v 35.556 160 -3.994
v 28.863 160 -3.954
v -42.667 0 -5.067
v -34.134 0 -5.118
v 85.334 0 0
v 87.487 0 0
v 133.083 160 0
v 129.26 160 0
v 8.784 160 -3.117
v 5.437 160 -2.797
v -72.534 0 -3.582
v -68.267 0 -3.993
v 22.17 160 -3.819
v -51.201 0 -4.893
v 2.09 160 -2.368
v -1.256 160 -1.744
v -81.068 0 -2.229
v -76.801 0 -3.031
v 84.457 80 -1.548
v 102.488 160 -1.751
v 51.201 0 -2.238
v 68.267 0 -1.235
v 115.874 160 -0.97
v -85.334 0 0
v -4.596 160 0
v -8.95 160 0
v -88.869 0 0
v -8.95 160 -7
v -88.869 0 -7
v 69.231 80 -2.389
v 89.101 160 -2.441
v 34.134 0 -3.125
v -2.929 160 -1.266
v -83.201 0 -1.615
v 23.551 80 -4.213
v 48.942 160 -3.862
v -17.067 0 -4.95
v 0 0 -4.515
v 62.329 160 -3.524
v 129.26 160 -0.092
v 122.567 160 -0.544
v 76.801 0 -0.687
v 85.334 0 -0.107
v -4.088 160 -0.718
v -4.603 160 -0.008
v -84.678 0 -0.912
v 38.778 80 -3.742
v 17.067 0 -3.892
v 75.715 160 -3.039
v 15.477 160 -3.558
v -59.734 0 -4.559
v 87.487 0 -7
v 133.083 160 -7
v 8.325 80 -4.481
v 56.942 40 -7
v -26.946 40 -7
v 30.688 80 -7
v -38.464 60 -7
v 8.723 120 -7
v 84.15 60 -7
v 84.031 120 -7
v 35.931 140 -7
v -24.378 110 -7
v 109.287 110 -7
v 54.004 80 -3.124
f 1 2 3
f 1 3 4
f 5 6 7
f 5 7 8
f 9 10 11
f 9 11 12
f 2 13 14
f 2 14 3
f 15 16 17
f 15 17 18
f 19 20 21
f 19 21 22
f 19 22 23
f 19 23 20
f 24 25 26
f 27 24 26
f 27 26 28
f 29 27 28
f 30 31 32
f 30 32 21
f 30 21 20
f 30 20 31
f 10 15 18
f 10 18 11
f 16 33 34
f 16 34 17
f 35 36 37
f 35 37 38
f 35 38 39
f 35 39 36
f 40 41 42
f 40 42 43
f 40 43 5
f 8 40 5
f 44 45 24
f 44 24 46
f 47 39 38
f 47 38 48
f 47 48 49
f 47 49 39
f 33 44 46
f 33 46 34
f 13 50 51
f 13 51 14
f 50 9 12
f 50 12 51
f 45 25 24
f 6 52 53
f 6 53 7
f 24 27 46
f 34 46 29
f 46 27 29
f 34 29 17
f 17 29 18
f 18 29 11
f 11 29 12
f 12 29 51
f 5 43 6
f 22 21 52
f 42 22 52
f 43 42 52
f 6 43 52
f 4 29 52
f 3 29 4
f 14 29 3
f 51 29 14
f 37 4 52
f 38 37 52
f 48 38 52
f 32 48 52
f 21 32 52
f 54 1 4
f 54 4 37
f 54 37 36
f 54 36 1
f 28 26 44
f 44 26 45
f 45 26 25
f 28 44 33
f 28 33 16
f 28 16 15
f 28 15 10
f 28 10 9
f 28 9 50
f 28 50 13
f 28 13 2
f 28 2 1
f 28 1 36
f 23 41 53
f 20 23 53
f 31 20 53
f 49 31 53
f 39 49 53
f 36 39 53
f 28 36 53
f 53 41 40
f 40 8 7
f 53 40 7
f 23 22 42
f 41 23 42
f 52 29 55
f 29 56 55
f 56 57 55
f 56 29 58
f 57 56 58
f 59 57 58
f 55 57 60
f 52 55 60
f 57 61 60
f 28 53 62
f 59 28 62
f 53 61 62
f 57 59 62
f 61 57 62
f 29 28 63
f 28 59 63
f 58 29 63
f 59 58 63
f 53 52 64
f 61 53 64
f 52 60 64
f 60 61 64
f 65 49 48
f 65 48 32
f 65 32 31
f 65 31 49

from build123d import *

# Parameters (mm, degrees)
F7_W      = 124.4431979082
F7_H      = 7
F9_W      = 74.3127836547
F9_H      = 7
F14_W     = 276.002407074
F14_H     = 30.9464875609
F15_DEPTH = 200


with BuildPart() as f5:
    # F2 (on Front) → F5 section 0
    with BuildSketch(Plane.XZ):
        Polygon((85.33424, -0.107453), (85.33424, 0.107451), (76.800816, 0.687353), (68.267393, 1.234847), (51.200543, 2.237735), (34.133696, 3.124644), (17.066846, 3.892161), (2e-06, 4.514701), (-17.066845, 4.949631), (-34.133695, 5.118482), (-42.667119, 5.067315), (-51.200542, 4.893345), (-59.733967, 4.559047), (-68.267391, 3.99279), (-72.534103, 3.581742), (-76.800815, 3.030836), (-81.067527, 2.229209), (-83.200883, 1.615195), (-84.614532, 0.89556), (-85.334239, -2e-06), (-84.677983, -0.911667), (-83.200883, -1.615199), (-81.067527, -2.22921), (-76.800815, -3.03084), (-72.534103, -3.581744), (-68.267391, -3.992792), (-59.733967, -4.559048), (-51.200542, -4.893346), (-42.667119, -5.067316), (-34.133695, -5.118483), (-17.066845, -4.949632), (2e-06, -4.514702), (17.066846, -3.892165), (34.133696, -3.124645), (51.200543, -2.237736), (68.267393, -1.234851), (76.800816, -0.687357), align=None)
    # F3 (on offset) → F5 section 1
    with BuildSketch(Plane.XZ.offset(-242)):
        Polygon((151.7721883423, -0.0841142291), (151.7721883423, 0.0588466904), (146.022191309, 0.4446183214), (140.27219327, 0.8088308689), (128.7721891468, 1.4759898717), (117.2721910575, 2.0659895201), (105.7721869344, 2.5765721341), (94.2721918621, 2.9907080691), (82.7721907559, 3.2800390551), (71.2721896496, 3.3923649172), (65.5221916107, 3.3583267467), (59.7721895491, 3.2425957602), (54.0221894988, 3.0202077499), (48.2721884429, 2.6435161153), (45.3971894234, 2.3700703464), (42.5221893982, 2.0035870455), (39.6471893731, 1.4703160053), (38.2096888577, 1.0618539367), (37.257142015, 0.5831232142), (36.7721883423, -0.012634775), (37.2143878926, -0.6191079446), (38.2096888577, -1.0871204698), (39.6471893731, -1.495583544), (42.5221893982, -2.0288545843), (45.3971894234, -2.3953378852), (48.2721884429, -2.6687806372), (54.0221894988, -3.0454752886), (59.7721895491, -3.2678592764), (65.5221916107, -3.3835942855), (71.2721896496, -3.417629439), (82.7721907559, -3.3053065939), (94.2721918621, -3.0159756079), (105.7721869344, -2.6018426898), (117.2721910575, -2.0912570589), (128.7721891468, -1.5012564048), (140.27219327, -0.8341014246), (146.022191309, -0.4698888771), align=None)
    loft()

    # F3 (on offset) → F8 section 0
    with BuildSketch(Plane.XZ.offset(-242)):
        Polygon((151.7721883423, -0.0841142291), (151.7721883423, 0.0588466904), (146.022191309, 0.4446183214), (140.27219327, 0.8088308689), (128.7721891468, 1.4759898717), (117.2721910575, 2.0659895201), (105.7721869344, 2.5765721341), (94.2721918621, 2.9907080691), (82.7721907559, 3.2800390551), (71.2721896496, 3.3923649172), (65.5221916107, 3.3583267467), (59.7721895491, 3.2425957602), (54.0221894988, 3.0202077499), (48.2721884429, 2.6435161153), (45.3971894234, 2.3700703464), (42.5221893982, 2.0035870455), (39.6471893731, 1.4703160053), (38.2096888577, 1.0618539367), (37.257142015, 0.5831232142), (36.7721883423, -0.012634775), (37.2143878926, -0.6191079446), (38.2096888577, -1.0871204698), (39.6471893731, -1.495583544), (42.5221893982, -2.0288545843), (45.3971894234, -2.3953378852), (48.2721884429, -2.6687806372), (54.0221894988, -3.0454752886), (59.7721895491, -3.2678592764), (65.5221916107, -3.3835942855), (71.2721896496, -3.417629439), (82.7721907559, -3.3053065939), (94.2721918621, -3.0159756079), (105.7721869344, -2.6018426898), (117.2721910575, -2.0912570589), (128.7721891468, -1.5012564048), (140.27219327, -0.8341014246), (146.022191309, -0.4698888771), align=None)
    # F4 (on offset) → F8 section 1
    with BuildSketch(Plane.XZ.offset(-315)):
        Polygon((172.8821369569, -0.0392518836), (172.8821369569, 0.0392481164), (169.6281849569, 0.2510951164), (166.3742329569, 0.4511011164), (159.8663269569, 0.8174671164), (153.3584209569, 1.1414641164), (146.8505149569, 1.4218491164), (140.3426109569, 1.6492701164), (133.8347059569, 1.8081551164), (127.3267999569, 1.8698371164), (124.0728479569, 1.8511541164), (120.8188949569, 1.7876011164), (117.5649419569, 1.6654781164), (114.3109889569, 1.4586201164), (112.6840129569, 1.3084581164), (111.0570359569, 1.1072051164), (109.4300599569, 0.8143601164), (108.6165719569, 0.5900561164), (108.0775209569, 0.3271631164), (107.8030829569, -2.8836e-06), (108.0533259569, -0.3330478836), (108.6165719569, -0.5900538836), (109.4300599569, -0.8143608836), (111.0570359569, -1.1072028836), (112.6840129569, -1.3084558836), (114.3109889569, -1.4586178836), (117.5649419569, -1.6654778836), (120.8188949569, -1.7875988836), (124.0728479569, -1.8511548836), (127.3267999569, -1.8698378836), (133.8347059569, -1.8081558836), (140.3426109569, -1.6492728836), (146.8505149569, -1.4218528836), (153.3584209569, -1.1414648836), (159.8663269569, -0.8174708836), (166.3742329569, -0.4511038836), (169.6281849569, -0.2510988836), align=None)
    loft()


with BuildPart() as f10:
    # F6 (on Front) → F10 section 0
    with BuildSketch(Plane.XZ):
        Polygon((61.0691448766, 0), (-88.8694618902, 0), (-88.8694618902, -7), (87.4868771153, -7), (87.4868771153, 0), align=None)
    # F7 (on offset) → F10 section 1
    with BuildSketch(Plane.XZ.offset(-242)):
        with Locations((94.229630797, -3.5)):
            Rectangle(F7_W, F7_H)
    loft()

    # F12: cut F5
    add(f5.part, mode=Mode.SUBTRACT)


with BuildPart() as f11:
    # F9 (on offset) → F11 section 0
    with BuildSketch(Plane.XZ.offset(-315)):
        with Locations((140.0638362015, -3.5)):
            Rectangle(F9_W, F9_H)
    # F7 (on offset) → F11 section 1
    with BuildSketch(Plane.XZ.offset(-242)):
        with Locations((94.229630797, -3.5)):
            Rectangle(F7_W, F7_H)
    loft()


with BuildPart() as f15_tool:
    # F14 (on offset) → F15 (new body)
    with BuildSketch(Plane.XZ.offset(-160)):
        with Locations((46.8171536922, -4.1513582692)):
            Rectangle(F14_W, F14_H)
    extrude(amount=-F15_DEPTH)


with BuildPart() as f10_1:
    add(f10.part)

    # F15: cut by f15_tool
    add(f15_tool.part, mode=Mode.SUBTRACT)


with BuildPart() as f11_1:
    add(f11.part)

    # F15: cut by f15_tool
    add(f15_tool.part, mode=Mode.SUBTRACT)


solid = f10_1.part
